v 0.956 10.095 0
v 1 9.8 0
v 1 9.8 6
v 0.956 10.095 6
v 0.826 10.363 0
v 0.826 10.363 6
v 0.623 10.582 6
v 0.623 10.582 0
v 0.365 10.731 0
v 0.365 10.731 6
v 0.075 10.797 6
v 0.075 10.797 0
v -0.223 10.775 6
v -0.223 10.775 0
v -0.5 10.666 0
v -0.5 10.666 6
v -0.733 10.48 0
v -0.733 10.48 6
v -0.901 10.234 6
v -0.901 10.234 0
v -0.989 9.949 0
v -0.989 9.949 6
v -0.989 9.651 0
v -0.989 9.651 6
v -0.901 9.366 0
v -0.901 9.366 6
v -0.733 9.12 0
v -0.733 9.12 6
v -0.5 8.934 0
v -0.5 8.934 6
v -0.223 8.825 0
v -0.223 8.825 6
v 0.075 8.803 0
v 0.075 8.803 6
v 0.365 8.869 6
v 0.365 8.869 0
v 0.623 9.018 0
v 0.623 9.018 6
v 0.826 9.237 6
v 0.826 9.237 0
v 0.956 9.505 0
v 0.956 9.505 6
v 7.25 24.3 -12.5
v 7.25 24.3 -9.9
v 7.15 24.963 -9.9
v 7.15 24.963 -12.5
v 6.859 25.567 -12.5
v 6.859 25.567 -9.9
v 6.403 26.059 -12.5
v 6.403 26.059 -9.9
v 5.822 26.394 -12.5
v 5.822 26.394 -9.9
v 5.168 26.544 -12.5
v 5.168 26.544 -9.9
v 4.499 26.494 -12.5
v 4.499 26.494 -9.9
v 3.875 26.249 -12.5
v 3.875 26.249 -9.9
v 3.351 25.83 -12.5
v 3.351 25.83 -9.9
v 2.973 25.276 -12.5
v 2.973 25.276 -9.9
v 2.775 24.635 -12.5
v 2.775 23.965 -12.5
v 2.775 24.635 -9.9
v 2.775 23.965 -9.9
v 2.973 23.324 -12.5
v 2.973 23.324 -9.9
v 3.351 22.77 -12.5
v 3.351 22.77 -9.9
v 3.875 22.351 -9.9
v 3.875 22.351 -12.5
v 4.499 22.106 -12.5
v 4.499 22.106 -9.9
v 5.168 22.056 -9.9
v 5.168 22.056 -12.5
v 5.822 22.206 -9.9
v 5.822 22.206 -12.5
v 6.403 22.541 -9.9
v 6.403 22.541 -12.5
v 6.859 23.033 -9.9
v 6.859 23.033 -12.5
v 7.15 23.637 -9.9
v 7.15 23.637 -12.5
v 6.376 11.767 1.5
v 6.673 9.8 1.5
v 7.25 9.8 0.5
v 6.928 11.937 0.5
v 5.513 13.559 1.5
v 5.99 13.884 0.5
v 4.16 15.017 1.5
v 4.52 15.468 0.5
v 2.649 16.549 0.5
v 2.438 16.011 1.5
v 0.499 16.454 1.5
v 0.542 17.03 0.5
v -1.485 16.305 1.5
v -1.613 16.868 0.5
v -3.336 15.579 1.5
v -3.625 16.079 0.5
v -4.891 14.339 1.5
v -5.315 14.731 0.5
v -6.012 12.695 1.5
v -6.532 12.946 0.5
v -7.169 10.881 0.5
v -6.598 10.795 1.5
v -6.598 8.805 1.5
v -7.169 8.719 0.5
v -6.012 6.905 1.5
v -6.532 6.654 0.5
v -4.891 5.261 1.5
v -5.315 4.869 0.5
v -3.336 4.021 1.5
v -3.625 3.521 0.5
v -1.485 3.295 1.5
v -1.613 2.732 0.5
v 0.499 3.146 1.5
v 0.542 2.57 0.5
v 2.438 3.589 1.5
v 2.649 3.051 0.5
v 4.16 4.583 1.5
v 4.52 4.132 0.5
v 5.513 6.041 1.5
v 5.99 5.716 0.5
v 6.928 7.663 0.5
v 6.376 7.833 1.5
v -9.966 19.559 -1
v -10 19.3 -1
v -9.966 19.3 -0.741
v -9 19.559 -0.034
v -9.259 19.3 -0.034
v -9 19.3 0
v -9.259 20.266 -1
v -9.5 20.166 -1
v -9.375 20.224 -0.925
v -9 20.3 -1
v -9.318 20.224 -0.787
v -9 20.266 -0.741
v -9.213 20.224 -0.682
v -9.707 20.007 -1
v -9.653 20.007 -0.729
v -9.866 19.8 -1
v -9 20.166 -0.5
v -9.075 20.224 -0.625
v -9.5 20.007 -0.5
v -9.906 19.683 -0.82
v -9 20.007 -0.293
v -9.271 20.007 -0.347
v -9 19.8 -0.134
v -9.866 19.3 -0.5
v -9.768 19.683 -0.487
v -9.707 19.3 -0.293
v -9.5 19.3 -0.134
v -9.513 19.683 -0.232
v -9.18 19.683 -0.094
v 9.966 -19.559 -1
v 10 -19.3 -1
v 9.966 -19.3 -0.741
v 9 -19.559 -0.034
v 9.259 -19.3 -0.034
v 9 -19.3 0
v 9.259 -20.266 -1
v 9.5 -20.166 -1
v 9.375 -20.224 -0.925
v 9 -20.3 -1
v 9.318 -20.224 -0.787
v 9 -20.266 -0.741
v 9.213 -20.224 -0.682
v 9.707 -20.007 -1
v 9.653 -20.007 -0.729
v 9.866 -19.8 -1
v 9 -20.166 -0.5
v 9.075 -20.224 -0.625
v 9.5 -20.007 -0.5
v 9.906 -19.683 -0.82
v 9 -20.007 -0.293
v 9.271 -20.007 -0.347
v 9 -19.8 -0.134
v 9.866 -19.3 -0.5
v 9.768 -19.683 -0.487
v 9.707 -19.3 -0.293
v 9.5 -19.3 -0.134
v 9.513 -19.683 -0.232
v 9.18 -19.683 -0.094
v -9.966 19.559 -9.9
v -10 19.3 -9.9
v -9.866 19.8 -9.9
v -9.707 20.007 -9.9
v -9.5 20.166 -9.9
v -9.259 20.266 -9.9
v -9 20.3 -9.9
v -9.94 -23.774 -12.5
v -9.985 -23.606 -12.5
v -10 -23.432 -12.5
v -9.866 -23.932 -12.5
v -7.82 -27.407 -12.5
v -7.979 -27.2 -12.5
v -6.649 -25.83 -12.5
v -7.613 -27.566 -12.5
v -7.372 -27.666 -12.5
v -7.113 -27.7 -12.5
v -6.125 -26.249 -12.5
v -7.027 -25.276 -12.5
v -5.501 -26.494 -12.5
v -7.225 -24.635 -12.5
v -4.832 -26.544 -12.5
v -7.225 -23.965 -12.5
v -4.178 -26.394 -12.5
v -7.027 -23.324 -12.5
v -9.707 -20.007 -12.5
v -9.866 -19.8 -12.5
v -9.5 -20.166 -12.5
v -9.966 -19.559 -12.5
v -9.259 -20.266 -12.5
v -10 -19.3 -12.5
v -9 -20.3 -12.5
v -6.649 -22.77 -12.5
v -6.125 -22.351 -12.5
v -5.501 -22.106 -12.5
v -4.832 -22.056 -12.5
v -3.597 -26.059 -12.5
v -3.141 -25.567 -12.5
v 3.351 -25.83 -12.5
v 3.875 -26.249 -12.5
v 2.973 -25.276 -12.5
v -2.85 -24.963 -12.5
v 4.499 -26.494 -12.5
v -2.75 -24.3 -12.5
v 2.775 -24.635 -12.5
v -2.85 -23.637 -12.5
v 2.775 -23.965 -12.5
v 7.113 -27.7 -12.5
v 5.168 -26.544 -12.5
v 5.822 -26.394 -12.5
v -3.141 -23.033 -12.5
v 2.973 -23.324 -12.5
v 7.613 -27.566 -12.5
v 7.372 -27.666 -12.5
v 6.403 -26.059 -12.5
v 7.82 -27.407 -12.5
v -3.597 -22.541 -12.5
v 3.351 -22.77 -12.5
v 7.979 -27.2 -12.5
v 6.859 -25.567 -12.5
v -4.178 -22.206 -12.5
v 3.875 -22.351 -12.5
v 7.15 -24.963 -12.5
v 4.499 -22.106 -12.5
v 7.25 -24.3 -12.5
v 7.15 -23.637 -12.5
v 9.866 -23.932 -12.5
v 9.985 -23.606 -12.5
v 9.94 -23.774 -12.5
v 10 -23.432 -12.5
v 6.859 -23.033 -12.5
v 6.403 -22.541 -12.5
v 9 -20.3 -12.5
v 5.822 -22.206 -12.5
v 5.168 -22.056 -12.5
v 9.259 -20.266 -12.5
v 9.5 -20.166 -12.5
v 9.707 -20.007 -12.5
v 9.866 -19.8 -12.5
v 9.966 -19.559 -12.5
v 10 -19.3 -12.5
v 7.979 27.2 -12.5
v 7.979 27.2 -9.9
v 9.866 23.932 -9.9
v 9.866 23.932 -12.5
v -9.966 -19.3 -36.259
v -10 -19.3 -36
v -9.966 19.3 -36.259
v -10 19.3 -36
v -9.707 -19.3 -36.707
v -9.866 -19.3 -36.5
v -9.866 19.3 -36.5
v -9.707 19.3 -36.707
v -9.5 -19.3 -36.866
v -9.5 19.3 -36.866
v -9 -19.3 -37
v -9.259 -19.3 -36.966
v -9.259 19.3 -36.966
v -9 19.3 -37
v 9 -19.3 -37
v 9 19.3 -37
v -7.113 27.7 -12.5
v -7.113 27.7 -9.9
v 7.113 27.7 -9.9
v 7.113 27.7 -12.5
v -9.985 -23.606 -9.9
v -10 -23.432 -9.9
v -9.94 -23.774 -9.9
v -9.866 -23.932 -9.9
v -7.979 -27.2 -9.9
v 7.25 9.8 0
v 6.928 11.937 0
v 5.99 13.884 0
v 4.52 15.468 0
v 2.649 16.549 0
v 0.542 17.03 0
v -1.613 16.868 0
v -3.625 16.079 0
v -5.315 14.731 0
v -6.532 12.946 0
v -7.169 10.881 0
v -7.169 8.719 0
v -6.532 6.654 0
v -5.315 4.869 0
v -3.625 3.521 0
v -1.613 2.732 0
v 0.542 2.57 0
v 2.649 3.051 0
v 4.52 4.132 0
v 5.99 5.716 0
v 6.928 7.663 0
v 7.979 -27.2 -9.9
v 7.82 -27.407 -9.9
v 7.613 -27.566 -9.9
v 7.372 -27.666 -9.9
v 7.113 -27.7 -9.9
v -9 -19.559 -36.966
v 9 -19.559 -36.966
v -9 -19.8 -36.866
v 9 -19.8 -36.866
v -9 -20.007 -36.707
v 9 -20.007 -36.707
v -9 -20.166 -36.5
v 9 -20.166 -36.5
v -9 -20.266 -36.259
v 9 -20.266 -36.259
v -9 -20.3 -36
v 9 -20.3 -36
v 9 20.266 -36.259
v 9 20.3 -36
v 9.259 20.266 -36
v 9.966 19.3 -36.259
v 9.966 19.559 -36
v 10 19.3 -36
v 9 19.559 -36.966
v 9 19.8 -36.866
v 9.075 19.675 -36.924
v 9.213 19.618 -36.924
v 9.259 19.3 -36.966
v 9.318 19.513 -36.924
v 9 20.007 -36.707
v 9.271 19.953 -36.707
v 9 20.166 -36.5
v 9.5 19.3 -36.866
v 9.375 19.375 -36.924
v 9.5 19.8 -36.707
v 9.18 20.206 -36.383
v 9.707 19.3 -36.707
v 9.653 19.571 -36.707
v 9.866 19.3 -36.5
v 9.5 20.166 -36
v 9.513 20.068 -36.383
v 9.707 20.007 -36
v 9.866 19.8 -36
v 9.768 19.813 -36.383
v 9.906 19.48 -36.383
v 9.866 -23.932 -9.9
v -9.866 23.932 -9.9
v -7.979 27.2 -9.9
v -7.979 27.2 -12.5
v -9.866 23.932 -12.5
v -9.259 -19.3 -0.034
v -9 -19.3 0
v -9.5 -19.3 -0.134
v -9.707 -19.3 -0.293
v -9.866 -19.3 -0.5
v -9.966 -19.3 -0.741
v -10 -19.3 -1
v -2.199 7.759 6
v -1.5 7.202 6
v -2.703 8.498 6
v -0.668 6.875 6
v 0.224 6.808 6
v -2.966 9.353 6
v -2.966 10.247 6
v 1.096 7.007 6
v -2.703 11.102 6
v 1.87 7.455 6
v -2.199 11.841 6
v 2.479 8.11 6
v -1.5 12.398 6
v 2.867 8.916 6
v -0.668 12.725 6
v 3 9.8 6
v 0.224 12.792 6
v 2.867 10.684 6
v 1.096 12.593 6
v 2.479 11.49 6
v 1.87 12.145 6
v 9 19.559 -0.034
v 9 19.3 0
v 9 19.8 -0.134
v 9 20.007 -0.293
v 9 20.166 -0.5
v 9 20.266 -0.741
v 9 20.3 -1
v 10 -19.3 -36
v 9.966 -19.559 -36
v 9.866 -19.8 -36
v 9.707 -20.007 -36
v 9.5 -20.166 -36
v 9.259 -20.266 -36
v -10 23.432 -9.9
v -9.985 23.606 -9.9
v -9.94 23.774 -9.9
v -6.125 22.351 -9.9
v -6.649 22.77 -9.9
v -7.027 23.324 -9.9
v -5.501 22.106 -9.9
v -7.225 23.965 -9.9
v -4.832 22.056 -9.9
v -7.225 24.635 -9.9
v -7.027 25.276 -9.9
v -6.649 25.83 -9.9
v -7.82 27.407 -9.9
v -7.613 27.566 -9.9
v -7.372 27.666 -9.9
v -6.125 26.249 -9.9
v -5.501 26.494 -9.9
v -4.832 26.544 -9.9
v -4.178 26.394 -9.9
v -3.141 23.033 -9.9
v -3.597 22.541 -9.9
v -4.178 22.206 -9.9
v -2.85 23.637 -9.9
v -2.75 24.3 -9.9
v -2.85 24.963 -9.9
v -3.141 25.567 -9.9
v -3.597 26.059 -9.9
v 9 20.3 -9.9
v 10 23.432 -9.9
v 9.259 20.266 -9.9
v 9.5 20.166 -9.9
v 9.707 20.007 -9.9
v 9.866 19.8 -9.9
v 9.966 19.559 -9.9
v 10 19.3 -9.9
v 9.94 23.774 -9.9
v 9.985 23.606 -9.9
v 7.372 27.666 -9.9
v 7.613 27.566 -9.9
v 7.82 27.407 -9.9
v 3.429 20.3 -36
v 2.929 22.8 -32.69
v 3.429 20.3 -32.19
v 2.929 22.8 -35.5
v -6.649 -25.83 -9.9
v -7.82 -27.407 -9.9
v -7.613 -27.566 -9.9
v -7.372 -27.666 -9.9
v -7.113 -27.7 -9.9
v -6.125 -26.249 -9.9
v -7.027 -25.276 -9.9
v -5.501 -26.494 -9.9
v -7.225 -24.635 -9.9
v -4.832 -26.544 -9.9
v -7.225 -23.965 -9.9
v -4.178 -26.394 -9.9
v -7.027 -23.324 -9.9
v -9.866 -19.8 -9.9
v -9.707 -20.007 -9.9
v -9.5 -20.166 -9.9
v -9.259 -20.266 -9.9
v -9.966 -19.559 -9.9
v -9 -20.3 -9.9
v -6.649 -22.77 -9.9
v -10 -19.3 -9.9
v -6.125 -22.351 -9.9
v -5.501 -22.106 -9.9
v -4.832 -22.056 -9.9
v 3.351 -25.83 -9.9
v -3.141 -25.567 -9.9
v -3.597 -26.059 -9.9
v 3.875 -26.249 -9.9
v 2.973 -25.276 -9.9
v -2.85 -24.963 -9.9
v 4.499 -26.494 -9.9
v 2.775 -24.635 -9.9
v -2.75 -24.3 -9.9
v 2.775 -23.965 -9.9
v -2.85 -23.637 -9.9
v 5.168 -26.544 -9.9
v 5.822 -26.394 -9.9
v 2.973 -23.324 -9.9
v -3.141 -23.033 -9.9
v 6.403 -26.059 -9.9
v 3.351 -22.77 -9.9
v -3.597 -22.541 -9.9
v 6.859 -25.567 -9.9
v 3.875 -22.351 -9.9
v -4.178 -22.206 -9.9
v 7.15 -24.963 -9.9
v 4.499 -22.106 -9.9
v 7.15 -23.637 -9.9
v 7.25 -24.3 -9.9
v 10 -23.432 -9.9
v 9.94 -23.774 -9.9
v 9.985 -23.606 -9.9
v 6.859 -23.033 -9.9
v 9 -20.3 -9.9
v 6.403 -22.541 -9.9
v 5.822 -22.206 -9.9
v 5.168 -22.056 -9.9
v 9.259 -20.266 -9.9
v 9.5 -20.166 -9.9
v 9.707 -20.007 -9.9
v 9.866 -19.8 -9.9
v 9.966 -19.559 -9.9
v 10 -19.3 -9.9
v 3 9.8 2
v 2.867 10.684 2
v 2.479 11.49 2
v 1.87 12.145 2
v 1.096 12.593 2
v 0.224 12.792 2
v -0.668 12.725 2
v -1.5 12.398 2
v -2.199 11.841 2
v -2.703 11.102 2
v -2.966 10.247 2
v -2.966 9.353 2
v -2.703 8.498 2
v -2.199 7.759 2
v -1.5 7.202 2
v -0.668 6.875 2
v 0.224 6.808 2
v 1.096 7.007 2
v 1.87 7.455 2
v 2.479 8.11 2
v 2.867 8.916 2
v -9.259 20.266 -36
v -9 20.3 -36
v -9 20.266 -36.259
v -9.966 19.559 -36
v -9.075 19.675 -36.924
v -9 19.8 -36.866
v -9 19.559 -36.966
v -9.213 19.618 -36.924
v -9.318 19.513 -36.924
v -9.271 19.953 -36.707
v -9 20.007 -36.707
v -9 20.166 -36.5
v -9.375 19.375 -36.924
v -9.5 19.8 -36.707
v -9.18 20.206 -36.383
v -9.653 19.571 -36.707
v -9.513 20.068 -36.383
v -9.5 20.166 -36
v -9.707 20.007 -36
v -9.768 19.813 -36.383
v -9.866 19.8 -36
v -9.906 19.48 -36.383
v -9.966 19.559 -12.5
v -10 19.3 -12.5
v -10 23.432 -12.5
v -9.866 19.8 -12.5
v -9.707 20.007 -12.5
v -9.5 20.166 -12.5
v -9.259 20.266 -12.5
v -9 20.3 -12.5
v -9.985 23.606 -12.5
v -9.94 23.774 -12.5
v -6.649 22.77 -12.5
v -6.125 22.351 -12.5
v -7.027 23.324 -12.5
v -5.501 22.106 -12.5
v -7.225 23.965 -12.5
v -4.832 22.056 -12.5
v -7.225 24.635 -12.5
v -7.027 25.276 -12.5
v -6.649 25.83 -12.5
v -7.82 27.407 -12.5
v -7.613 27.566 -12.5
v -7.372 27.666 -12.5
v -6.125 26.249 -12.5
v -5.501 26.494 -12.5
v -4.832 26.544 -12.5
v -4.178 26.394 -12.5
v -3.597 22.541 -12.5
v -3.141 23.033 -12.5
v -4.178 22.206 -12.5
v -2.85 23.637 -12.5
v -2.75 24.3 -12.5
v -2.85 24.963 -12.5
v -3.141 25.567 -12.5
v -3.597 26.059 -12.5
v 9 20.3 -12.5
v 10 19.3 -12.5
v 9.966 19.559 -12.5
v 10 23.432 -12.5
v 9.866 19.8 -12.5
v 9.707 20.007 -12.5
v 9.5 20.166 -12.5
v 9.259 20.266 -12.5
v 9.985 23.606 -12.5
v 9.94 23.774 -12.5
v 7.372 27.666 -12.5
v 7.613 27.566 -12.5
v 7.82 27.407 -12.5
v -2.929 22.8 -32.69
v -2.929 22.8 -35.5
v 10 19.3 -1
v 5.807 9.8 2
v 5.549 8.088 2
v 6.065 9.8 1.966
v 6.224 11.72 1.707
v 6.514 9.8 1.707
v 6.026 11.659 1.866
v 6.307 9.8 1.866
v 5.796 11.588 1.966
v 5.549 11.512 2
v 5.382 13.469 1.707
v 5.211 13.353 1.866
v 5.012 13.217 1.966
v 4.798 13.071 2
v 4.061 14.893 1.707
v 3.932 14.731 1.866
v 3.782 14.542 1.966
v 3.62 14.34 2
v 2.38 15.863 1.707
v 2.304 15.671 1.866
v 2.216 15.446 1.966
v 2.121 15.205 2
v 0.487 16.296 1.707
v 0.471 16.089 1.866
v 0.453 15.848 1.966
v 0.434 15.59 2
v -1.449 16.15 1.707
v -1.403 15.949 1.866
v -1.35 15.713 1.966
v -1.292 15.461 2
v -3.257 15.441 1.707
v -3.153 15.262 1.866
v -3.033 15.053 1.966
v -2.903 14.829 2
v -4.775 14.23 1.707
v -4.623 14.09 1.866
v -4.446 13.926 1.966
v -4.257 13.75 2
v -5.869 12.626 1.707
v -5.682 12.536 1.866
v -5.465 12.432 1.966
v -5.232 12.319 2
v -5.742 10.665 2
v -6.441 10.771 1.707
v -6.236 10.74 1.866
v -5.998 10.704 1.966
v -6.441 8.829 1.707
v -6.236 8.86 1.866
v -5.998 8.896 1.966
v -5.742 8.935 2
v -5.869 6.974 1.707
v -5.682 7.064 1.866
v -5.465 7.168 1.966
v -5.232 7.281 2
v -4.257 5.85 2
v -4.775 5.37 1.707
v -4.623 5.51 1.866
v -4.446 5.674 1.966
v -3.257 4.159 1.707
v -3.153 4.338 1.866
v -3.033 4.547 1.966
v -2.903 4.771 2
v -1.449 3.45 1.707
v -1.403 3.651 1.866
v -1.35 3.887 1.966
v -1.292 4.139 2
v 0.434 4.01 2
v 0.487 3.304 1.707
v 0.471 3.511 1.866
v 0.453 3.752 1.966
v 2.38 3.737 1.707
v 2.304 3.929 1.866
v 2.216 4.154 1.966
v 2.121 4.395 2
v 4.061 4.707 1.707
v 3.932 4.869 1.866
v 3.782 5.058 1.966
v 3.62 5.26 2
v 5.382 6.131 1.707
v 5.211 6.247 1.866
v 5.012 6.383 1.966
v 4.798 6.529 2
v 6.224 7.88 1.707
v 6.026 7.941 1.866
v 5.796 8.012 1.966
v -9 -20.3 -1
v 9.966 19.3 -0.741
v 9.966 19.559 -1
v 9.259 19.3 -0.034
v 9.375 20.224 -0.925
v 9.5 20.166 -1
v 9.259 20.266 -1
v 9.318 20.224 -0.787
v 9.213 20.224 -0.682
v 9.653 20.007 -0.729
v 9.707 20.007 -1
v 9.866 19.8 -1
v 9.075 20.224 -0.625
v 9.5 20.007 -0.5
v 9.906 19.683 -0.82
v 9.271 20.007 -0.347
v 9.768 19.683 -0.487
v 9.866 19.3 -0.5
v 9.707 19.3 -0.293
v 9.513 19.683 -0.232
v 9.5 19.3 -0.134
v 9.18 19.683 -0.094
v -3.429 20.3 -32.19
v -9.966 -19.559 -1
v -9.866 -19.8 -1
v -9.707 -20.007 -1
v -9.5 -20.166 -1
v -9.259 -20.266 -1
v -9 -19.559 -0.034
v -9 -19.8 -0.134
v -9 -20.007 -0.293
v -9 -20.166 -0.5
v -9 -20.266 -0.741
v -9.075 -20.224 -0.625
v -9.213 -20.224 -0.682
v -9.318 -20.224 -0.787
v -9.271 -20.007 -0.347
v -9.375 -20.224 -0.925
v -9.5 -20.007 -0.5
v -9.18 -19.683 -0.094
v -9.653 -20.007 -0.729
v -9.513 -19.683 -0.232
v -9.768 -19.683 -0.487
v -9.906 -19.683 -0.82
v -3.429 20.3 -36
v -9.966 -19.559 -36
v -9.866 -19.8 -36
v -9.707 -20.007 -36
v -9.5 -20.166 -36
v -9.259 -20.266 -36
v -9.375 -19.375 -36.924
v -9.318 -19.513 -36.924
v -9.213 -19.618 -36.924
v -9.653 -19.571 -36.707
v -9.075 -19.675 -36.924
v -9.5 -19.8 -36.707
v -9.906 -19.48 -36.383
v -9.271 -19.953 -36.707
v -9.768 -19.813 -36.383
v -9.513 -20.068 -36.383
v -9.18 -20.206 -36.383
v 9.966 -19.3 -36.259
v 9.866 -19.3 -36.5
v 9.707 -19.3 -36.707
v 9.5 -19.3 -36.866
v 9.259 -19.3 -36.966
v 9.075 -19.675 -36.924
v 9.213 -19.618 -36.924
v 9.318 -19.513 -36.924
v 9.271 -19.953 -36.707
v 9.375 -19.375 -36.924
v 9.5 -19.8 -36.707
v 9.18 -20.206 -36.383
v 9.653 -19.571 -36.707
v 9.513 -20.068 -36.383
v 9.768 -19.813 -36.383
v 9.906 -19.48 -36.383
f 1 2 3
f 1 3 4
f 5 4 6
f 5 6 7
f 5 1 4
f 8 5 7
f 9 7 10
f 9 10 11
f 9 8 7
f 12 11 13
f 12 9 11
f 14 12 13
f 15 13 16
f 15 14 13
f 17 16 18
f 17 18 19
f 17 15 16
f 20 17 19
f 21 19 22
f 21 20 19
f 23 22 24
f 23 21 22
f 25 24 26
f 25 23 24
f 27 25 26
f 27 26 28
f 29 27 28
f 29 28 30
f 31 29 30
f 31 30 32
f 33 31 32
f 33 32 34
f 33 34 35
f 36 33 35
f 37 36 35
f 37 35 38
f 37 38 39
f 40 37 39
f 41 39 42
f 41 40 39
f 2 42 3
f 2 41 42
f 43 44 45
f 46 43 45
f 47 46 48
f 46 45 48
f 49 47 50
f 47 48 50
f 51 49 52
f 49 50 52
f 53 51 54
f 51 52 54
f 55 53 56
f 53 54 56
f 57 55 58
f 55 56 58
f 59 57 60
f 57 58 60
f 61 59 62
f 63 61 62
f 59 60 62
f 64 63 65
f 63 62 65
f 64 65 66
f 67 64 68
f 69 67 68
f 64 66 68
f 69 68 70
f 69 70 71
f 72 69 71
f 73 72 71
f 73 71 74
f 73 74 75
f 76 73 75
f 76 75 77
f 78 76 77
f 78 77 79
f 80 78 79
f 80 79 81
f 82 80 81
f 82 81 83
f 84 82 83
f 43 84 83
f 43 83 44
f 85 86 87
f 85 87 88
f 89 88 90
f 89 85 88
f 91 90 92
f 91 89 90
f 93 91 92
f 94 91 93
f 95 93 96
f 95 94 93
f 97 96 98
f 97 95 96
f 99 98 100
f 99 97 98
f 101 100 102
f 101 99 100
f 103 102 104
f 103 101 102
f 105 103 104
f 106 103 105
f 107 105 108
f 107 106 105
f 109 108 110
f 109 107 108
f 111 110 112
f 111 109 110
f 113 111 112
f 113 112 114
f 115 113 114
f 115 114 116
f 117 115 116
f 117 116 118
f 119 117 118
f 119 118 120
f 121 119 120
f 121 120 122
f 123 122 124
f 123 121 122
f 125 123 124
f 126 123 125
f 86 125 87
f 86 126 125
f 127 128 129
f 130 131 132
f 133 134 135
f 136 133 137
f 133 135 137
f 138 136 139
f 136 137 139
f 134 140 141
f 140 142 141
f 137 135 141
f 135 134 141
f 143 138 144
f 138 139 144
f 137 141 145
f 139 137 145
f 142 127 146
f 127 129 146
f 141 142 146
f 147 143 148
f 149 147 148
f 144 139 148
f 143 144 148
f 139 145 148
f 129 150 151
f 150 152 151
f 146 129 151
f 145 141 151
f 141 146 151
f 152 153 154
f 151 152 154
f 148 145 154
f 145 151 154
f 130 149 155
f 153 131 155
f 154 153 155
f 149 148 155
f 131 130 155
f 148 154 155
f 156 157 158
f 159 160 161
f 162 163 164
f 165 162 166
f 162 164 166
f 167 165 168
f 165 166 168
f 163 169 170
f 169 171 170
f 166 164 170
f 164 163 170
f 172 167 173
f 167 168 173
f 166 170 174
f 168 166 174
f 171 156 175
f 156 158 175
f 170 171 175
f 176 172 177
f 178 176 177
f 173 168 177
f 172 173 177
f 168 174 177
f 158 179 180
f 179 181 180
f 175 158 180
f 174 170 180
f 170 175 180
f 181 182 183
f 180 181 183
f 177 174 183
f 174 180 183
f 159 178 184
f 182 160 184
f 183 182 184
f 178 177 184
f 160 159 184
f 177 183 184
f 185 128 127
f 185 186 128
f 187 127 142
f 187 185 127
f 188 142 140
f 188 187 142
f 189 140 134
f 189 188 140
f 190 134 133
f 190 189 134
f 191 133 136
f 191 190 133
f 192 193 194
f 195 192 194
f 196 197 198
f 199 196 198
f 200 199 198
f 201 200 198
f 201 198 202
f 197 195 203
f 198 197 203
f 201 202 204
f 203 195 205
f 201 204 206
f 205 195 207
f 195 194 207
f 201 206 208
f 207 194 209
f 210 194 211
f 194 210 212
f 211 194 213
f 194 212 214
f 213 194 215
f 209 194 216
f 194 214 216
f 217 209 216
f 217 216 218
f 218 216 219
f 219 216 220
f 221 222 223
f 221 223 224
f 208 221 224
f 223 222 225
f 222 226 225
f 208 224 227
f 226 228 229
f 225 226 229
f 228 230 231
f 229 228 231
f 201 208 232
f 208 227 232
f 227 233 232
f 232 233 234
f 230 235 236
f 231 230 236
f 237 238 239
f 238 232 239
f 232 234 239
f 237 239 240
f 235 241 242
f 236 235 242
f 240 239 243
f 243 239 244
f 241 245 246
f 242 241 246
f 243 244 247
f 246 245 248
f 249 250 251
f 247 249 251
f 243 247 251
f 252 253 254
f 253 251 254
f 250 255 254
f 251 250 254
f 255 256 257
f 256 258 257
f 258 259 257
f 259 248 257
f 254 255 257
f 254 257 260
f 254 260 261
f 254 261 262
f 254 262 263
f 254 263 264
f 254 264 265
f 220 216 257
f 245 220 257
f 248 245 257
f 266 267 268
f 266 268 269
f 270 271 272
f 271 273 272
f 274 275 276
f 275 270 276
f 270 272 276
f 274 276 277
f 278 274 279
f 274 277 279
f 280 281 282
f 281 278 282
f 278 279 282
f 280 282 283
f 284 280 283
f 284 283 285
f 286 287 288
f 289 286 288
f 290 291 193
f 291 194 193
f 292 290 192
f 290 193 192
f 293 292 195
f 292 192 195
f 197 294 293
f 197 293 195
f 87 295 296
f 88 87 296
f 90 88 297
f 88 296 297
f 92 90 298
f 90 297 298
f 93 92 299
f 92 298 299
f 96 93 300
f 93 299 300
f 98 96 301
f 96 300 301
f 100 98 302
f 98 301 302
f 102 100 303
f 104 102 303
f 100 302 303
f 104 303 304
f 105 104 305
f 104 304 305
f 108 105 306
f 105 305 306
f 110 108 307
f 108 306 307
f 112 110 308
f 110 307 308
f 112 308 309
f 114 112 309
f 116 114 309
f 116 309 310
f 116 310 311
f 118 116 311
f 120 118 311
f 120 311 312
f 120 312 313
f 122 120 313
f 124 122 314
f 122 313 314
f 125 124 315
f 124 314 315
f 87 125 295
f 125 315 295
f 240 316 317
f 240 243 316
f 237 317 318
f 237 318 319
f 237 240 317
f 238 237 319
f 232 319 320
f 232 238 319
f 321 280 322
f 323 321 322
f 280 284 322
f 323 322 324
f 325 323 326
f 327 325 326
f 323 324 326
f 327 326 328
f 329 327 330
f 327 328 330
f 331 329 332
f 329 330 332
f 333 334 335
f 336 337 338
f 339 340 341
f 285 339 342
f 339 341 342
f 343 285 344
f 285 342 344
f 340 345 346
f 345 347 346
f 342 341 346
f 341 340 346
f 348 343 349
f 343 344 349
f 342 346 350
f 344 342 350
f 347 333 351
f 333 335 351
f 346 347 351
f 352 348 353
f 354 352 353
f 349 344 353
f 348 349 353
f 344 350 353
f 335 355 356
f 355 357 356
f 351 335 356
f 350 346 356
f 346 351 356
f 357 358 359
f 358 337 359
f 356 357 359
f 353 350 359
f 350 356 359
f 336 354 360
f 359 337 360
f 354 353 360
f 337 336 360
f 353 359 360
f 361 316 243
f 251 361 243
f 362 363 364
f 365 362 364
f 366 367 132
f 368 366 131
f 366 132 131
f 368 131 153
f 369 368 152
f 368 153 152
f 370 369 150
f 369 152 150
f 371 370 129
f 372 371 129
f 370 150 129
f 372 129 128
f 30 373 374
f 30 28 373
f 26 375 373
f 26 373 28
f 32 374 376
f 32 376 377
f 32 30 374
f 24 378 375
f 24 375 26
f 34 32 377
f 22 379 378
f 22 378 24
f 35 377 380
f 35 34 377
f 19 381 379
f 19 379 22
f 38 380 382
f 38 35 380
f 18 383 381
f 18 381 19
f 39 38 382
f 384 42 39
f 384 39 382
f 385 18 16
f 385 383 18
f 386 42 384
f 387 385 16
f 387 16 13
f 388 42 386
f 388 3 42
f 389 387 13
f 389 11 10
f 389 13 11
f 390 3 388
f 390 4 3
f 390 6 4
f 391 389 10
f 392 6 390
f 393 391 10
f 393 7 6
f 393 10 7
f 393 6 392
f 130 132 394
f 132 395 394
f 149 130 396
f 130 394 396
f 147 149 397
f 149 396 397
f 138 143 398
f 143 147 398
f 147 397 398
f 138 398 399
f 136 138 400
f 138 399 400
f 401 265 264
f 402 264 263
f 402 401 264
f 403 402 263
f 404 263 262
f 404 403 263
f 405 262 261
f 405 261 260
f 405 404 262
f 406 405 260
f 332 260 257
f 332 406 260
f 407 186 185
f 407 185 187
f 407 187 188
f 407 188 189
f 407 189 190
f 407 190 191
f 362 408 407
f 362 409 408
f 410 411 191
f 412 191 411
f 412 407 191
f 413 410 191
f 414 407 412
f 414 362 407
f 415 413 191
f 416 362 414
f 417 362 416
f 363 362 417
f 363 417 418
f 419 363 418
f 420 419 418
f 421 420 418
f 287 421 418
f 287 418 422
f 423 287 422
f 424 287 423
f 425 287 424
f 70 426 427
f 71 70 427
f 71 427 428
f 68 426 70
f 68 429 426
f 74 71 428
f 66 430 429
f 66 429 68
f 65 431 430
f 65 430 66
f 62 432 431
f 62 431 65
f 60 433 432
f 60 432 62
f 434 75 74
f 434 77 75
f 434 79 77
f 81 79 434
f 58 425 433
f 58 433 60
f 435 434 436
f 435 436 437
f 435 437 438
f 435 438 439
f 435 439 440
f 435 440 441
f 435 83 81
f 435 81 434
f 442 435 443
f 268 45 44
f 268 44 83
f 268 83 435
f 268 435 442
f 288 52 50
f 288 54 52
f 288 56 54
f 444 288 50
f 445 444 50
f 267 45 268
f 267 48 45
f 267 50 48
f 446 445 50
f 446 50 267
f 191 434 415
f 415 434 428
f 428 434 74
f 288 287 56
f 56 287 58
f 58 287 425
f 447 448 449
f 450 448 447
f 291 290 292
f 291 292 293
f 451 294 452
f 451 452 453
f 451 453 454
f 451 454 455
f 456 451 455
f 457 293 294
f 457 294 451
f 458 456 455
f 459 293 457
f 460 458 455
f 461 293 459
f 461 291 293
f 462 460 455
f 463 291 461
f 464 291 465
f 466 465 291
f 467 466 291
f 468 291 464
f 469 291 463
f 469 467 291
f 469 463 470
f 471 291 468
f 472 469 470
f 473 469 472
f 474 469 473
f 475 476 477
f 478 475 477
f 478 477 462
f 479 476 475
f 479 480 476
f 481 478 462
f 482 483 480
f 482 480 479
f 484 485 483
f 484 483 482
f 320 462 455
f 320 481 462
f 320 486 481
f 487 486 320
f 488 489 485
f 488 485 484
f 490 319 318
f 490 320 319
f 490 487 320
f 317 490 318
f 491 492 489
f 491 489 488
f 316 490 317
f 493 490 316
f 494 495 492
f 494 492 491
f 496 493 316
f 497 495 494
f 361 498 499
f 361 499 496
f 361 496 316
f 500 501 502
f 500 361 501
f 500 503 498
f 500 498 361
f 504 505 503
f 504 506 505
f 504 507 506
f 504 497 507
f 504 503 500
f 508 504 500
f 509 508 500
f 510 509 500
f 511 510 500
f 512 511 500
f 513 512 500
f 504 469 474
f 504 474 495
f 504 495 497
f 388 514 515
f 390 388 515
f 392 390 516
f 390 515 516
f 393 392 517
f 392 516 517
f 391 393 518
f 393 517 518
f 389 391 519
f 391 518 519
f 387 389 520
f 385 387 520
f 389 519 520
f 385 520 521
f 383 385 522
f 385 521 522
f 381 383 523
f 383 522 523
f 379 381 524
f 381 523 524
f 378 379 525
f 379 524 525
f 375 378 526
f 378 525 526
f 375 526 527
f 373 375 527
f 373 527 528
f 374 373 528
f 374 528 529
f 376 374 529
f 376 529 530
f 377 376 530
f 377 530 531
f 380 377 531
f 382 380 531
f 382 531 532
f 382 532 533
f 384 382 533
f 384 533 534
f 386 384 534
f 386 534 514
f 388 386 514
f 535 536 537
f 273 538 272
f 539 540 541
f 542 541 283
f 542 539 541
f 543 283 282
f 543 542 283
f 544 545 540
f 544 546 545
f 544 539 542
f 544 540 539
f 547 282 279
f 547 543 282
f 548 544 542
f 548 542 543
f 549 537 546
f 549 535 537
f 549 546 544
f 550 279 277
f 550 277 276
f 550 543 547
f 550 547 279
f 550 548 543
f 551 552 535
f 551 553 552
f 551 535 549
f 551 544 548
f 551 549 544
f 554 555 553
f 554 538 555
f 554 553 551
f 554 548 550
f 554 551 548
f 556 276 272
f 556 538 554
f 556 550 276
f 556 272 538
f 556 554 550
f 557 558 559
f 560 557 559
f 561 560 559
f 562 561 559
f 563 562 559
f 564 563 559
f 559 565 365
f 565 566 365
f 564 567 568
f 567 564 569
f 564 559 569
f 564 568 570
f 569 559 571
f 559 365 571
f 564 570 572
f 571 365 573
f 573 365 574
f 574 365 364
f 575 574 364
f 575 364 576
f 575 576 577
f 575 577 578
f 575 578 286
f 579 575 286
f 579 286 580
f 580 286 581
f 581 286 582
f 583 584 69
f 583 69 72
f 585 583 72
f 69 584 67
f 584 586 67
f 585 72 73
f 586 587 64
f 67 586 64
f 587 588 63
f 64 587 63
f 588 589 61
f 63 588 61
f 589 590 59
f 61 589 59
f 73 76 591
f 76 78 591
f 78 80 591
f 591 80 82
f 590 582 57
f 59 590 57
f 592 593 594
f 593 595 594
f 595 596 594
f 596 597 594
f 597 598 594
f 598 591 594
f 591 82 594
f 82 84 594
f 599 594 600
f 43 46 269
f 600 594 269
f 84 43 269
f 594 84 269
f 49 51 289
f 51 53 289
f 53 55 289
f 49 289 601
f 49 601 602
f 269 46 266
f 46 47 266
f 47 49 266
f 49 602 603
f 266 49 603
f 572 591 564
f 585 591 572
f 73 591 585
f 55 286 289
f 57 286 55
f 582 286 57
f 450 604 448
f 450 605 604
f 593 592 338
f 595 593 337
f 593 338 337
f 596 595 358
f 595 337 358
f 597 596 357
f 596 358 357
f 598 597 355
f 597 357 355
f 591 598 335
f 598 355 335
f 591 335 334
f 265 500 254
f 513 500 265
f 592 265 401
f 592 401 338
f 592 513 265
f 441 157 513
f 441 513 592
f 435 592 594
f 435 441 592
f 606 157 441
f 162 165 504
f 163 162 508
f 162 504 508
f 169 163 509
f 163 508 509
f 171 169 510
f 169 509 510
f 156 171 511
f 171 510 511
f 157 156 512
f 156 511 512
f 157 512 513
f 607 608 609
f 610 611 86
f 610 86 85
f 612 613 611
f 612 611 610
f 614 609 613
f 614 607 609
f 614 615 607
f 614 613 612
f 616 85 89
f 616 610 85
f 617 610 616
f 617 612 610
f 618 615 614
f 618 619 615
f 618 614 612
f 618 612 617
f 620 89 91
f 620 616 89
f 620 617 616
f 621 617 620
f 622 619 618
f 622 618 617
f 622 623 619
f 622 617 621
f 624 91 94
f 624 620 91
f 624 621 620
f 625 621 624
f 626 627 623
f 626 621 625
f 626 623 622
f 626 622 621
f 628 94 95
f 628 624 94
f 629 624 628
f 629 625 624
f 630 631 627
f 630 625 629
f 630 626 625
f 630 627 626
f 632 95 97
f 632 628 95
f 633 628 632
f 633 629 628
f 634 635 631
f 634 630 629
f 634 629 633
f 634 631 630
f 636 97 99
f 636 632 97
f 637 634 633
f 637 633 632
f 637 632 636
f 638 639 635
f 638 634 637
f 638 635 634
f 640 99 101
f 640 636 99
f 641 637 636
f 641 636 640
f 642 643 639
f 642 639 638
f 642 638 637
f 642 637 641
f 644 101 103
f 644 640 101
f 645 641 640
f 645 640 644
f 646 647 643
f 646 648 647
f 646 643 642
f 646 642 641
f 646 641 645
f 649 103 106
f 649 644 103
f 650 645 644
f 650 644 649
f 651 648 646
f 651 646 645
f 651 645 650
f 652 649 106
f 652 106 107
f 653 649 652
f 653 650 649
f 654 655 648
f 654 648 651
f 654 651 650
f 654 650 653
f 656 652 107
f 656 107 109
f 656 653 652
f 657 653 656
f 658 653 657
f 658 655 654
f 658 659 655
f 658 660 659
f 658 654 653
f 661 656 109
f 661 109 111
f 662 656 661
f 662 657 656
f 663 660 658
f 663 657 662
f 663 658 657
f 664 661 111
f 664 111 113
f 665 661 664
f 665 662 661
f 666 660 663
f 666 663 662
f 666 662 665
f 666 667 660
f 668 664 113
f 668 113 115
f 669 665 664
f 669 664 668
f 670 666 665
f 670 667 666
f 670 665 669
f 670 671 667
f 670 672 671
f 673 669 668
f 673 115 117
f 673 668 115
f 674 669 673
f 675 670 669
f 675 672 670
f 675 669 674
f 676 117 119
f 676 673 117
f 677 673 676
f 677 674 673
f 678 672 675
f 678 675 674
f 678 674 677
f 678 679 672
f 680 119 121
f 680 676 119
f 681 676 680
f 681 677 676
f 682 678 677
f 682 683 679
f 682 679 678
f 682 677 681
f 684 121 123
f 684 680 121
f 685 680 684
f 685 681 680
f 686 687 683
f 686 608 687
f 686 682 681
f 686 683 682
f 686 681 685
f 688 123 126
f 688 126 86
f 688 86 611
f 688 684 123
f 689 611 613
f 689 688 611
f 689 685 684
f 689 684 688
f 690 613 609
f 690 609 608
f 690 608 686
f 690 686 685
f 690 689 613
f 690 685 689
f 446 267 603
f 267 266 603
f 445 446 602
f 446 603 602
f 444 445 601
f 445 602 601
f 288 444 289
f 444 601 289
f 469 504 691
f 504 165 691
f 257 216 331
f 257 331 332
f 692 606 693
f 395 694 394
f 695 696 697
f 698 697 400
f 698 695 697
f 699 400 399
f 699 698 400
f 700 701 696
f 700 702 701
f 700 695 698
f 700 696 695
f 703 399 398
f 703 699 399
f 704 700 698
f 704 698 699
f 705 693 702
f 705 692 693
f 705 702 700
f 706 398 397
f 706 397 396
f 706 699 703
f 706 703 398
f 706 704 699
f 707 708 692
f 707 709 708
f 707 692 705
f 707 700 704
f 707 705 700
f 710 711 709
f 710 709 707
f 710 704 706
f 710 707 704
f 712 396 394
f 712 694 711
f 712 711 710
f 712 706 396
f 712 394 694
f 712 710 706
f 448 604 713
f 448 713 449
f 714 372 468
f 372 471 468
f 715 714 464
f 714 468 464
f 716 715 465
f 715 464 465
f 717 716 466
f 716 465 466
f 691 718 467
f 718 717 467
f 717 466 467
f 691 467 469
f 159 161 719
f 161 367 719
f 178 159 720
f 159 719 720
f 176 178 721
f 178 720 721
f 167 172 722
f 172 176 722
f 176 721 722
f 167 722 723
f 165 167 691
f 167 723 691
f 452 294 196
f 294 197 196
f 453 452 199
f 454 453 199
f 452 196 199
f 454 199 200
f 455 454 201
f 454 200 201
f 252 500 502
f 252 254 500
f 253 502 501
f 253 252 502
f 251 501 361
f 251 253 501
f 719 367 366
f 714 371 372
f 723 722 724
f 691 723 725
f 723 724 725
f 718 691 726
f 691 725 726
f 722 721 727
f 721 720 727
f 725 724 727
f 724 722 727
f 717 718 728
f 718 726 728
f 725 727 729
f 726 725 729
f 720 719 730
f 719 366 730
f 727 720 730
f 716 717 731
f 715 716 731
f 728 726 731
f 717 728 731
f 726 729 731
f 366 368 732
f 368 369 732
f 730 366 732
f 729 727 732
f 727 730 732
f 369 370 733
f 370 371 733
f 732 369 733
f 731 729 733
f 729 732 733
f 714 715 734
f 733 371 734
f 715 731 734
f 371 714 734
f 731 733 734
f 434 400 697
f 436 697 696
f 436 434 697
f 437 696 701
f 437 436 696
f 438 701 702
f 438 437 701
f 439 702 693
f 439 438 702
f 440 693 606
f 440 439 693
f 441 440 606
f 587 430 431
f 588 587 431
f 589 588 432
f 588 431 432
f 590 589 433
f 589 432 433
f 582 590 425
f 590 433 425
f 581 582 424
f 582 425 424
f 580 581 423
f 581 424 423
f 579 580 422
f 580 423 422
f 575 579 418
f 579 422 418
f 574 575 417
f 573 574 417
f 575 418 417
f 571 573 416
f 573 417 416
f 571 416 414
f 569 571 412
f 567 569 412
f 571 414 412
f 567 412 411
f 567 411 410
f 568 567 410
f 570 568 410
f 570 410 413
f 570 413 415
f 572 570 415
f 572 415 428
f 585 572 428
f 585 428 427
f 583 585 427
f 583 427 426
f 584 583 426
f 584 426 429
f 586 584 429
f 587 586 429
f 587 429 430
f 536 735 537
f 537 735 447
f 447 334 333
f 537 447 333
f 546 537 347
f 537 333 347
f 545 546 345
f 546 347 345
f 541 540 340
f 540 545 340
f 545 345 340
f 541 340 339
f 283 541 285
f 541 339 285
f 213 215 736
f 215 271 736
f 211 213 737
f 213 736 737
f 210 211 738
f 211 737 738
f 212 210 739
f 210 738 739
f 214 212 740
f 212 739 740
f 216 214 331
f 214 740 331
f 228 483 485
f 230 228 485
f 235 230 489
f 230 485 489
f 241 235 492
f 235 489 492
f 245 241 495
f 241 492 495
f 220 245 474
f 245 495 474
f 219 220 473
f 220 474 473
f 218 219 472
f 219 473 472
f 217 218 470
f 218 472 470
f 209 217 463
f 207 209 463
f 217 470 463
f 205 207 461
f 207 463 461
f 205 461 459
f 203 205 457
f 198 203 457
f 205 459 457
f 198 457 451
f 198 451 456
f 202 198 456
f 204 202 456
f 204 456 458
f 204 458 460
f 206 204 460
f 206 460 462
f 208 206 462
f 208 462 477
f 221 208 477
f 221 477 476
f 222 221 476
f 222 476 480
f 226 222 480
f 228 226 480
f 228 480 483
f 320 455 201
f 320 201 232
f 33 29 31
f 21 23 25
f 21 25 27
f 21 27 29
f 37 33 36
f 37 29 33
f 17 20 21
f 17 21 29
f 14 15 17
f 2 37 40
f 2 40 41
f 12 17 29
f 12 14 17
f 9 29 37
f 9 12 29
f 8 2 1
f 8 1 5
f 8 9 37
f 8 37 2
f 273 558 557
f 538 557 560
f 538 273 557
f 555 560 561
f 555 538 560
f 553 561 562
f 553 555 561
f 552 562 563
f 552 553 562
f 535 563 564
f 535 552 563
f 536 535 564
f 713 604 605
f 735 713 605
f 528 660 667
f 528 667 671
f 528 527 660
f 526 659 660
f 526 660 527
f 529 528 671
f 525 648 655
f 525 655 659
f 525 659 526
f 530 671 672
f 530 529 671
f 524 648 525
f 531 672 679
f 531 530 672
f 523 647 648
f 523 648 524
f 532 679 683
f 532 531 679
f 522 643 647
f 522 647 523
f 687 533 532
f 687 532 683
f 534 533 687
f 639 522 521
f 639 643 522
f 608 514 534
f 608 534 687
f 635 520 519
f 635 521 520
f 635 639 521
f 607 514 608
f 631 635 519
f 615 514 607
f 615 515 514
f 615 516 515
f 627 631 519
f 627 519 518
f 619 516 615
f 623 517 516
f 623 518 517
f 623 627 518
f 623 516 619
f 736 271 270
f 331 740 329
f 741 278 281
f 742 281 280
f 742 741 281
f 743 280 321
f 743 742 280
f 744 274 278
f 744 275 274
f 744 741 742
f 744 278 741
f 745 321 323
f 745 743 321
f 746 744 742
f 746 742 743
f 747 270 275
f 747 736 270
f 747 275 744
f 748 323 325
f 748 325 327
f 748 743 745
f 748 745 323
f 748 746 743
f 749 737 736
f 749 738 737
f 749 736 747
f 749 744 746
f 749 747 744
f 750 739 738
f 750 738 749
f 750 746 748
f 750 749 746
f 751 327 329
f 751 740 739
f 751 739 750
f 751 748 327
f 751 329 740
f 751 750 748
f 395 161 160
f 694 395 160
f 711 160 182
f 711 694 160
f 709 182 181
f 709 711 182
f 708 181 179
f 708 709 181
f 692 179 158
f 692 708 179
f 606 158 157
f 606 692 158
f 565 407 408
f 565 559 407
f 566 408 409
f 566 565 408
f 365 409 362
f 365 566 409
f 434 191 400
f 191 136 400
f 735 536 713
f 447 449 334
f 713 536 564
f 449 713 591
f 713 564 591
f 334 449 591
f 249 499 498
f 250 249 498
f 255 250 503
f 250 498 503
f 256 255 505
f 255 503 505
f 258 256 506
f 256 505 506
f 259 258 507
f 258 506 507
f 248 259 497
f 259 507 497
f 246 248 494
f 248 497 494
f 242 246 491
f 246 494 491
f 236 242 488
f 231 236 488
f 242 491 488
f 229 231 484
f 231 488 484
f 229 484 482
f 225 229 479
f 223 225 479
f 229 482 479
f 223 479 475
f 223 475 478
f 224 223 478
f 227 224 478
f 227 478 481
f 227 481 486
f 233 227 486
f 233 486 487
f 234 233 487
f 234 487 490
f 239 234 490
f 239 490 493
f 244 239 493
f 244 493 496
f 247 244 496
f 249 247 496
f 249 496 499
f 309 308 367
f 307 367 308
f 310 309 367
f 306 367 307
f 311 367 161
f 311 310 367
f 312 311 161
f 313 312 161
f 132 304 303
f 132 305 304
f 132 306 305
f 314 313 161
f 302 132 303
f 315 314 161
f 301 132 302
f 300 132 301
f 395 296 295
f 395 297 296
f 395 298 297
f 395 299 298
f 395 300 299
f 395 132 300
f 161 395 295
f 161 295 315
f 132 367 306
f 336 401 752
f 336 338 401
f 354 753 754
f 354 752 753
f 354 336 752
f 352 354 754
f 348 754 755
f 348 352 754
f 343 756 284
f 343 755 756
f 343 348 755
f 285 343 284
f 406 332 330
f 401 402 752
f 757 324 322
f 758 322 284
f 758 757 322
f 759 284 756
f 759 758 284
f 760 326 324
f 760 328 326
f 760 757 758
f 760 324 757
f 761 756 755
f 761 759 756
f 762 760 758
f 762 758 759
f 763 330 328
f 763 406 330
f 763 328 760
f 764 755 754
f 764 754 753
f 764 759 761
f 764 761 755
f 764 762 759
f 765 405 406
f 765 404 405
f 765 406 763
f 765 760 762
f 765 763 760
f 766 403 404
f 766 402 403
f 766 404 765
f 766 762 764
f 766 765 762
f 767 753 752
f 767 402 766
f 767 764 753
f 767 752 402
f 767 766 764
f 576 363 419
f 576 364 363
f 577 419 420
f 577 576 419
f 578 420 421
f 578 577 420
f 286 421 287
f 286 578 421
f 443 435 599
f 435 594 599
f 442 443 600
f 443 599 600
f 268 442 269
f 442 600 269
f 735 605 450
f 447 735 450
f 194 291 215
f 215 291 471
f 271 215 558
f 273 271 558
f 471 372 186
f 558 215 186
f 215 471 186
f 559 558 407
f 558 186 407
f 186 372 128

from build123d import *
from OCP.BRepFilletAPI import BRepFilletAPI_MakeChamfer

# Parameters (mm, degrees)
SKETCH3_W           = 20
SKETCH3_H           = 40.6
BOSS_EXTRUDE1_DEPTH = 37
SKETCH3_3_W         = 20
SKETCH3_3_H         = 7.4
SKETCH3_3_R         = 2.25
BOSS_EXTRUDE2_DEPTH = 12.5
SKETCH3_4_W         = 20
SKETCH3_4_H         = 7.4
SKETCH3_4_R         = 2.25
CUT_EXTRUDE1_DEPTH  = 9.9
SKETCH3_5_R         = 3
SKETCH3_5_R_2       = 1
BOSS_EXTRUDE3_DEPTH = 6
SKETCH3_6_R         = 7.25
SKETCH3_6_R_2       = 3
BOSS_EXTRUDE4_DEPTH = 2
CHAMFER1_SIZE       = 4
CHAMFER1_SIZE2      = 2.309401077
CHAMFER3_SIZE       = 1.5
CHAMFER3_SIZE2      = 0.866025404
FILLET2_R           = 1
SKETCH4_W           = 6.858
SKETCH4_H           = 3.81
BOSS_EXTRUDE6_DEPTH = 2.5
CHAMFER4_SIZE       = 2.5
CHAMFER4_SIZE_2     = 0.5


with BuildPart() as part:
    # Sketch3 → Boss-Extrude1 (new body)
    with BuildSketch(Plane.XY):
        Rectangle(SKETCH3_W, SKETCH3_H)
    extrude(amount=-BOSS_EXTRUDE1_DEPTH)

    # Sketch3<3> → Boss-Extrude2 (add)
    # profile 1 of 2: a face of its own
    with BuildSketch(Plane.XY):
        with Locations((0, 24)):
            Rectangle(SKETCH3_3_W, SKETCH3_3_H)
        with Locations((-5, 24.3)):
            Circle(SKETCH3_3_R, mode=Mode.SUBTRACT)
        with Locations((5, 24.3)):
            Circle(SKETCH3_3_R, mode=Mode.SUBTRACT)
    # profile 2 of 2: a face of its own
    with BuildSketch(Plane.XY):
        Polygon((10, -20.3), (-10, -20.3), (-10, -27.7), (0, -27.7), (10, -27.7), align=None)
        with Locations((-5, -24.3)):
            Circle(SKETCH3_3_R, mode=Mode.SUBTRACT)
        with Locations((5, -24.3)):
            Circle(SKETCH3_3_R, mode=Mode.SUBTRACT)
    extrude(amount=-BOSS_EXTRUDE2_DEPTH)

    # Sketch3<4> → Cut-Extrude1 (cut)
    # profile 1 of 2: a face of its own
    with BuildSketch(Plane.XY):
        with Locations((0, 24)):
            Rectangle(SKETCH3_4_W, SKETCH3_4_H)
        with Locations((-5, 24.3)):
            Circle(SKETCH3_4_R, mode=Mode.SUBTRACT)
        with Locations((5, 24.3)):
            Circle(SKETCH3_4_R, mode=Mode.SUBTRACT)
    # profile 2 of 2: a face of its own
    with BuildSketch(Plane.XY):
        Polygon((10, -20.3), (-10, -20.3), (-10, -27.7), (0, -27.7), (10, -27.7), align=None)
        with Locations((-5, -24.3)):
            Circle(SKETCH3_4_R, mode=Mode.SUBTRACT)
        with Locations((5, -24.3)):
            Circle(SKETCH3_4_R, mode=Mode.SUBTRACT)
    extrude(amount=-CUT_EXTRUDE1_DEPTH, mode=Mode.SUBTRACT)

    # Sketch3<5> → Boss-Extrude3 (add)
    with BuildSketch(Plane.XY):
        with Locations((0, 9.8)):
            Circle(SKETCH3_5_R)
        with Locations((0, 9.8)):
            Circle(SKETCH3_5_R_2, mode=Mode.SUBTRACT)
    extrude(amount=BOSS_EXTRUDE3_DEPTH)

    # Sketch3<6> → Boss-Extrude4 (add)
    with BuildSketch(Plane.XY):
        with Locations((0, 9.8)):
            Circle(SKETCH3_6_R)
        with Locations((0, 9.8)):
            Circle(SKETCH3_6_R_2, mode=Mode.SUBTRACT)
    extrude(amount=BOSS_EXTRUDE4_DEPTH)

    # Chamfer1: one chamfer whose edges measure the first distance from different faces: ONE call of the kernel's chamfer builder (chamfer() names one face for all edges)
    chamfer1_edges_1 = [part.edges().sort_by_distance(p)[0] for p in [
        (10, 27.7, -11.2),
        (10, -27.7, -11.2),
    ]]
    chamfer1_side_1 = [part.faces().sort_by_distance(p)[0] for p in [
        (10, 0, -18.317675312),
    ]]
    chamfer1_edges_2 = [part.edges().sort_by_distance(p)[0] for p in [
        (-10, 27.7, -11.2),
        (-10, -27.7, -11.2),
    ]]
    chamfer1_side_2 = [part.faces().sort_by_distance(p)[0] for p in [
        (-10, 0, -18.317675312),
    ]]
    chamfer1 = BRepFilletAPI_MakeChamfer(part.part.solid().wrapped)
    for e in chamfer1_edges_1:
        chamfer1.Add(CHAMFER1_SIZE, CHAMFER1_SIZE2, e.wrapped, chamfer1_side_1[0].wrapped)  # the first distance lies on this face
    for e in chamfer1_edges_2:
        chamfer1.Add(CHAMFER1_SIZE, CHAMFER1_SIZE2, e.wrapped, chamfer1_side_2[0].wrapped)  # the first distance lies on this face
    add(Compound.cast(chamfer1.Shape()), mode=Mode.REPLACE)

    # Chamfer3
    chamfer3_edges = [part.edges().sort_by_distance(p)[0] for p in [
        (-7.25, 9.8, 2),
    ]]
    chamfer3_side = [part.faces().sort_by_distance(p)[0] for p in [
        (-7.25, 9.8, 1),
    ]]
    chamfer(chamfer3_edges, length=CHAMFER3_SIZE, length2=CHAMFER3_SIZE2, reference=chamfer3_side[0])

    # Fillet2
    fillet2_edges = [part.edges().sort_by_distance(p)[0] for p in [
        (10, -20.3, -24.75),
        (-10, -20.3, -24.75),
        (-10, 20.3, -24.75),
        (10, 20.3, -24.75),
        (-7.690598923, -27.7, -11.2),
        (7.690598923, -27.7, -11.2),
        (0, 20.3, -37),
        (10, 23.7, -11.2),
        (10, -23.7, -11.2),
        (-10, 23.7, -11.2),
        (-10, -23.7, -11.2),
        (-7.690598923, 27.7, -11.2),
        (7.690598923, 27.7, -11.2),
        (-6.383974596, 9.8, 2),
        (-10, 0, -37),
        (0, -20.3, -37),
        (10, 0, -37),
        (10, 0, 0),
        (-10, 0, 0),
        (10, 20.3, -4.95),
        (-10, 20.3, -4.95),
        (0, 20.3, 0),
        (10, -20.3, -4.95),
        (0, -20.3, 0),
        (-10, -20.3, -4.95),
    ]]
    fillet(fillet2_edges, radius=FILLET2_R)

    # Sketch4 → Boss-Extrude6 (add)
    with BuildSketch(Plane(origin=(0, 20.3, 0), x_dir=(1, 0, 0), z_dir=(0, 1, 0))):
        with Locations((0, 34.095)):
            Rectangle(SKETCH4_W, SKETCH4_H)
    extrude(amount=BOSS_EXTRUDE6_DEPTH)

    # Chamfer4
    chamfer4_edges_1 = [part.edges().sort_by_distance(p)[0] for p in [
        (0, 22.8, -32.19),
    ]]
    chamfer4_side_1 = [part.faces().sort_by_distance(p)[0] for p in [
        (0, 22.79, -32.19),
    ]]
    chamfer4_edges_2 = [part.edges().sort_by_distance(p)[0] for p in [
        (-3.429, 22.8, -34.095),
    ]]
    chamfer4_side_2 = [part.faces().sort_by_distance(p)[0] for p in [
        (-3.429, 22.79, -34.095),
    ]]
    chamfer4_edges_3 = [part.edges().sort_by_distance(p)[0] for p in [
        (0, 22.8, -36),
    ]]
    chamfer4_side_3 = [part.faces().sort_by_distance(p)[0] for p in [
        (0, 22.79, -36),
    ]]
    chamfer4_edges_4 = [part.edges().sort_by_distance(p)[0] for p in [
        (3.429, 22.8, -34.095),
    ]]
    chamfer4_side_4 = [part.faces().sort_by_distance(p)[0] for p in [
        (3.429, 22.79, -34.095),
    ]]
    chamfer4 = BRepFilletAPI_MakeChamfer(part.part.solid().wrapped)
    for e in chamfer4_edges_1:
        chamfer4.Add(CHAMFER4_SIZE - 0.0001, CHAMFER4_SIZE_2 - 0.0001, e.wrapped, chamfer4_side_1[0].wrapped)
    for e in chamfer4_edges_2:
        chamfer4.Add(CHAMFER4_SIZE - 0.0001, CHAMFER4_SIZE_2 - 0.0001, e.wrapped, chamfer4_side_2[0].wrapped)
    for e in chamfer4_edges_3:
        chamfer4.Add(CHAMFER4_SIZE - 0.0001, CHAMFER4_SIZE_2 - 0.0001, e.wrapped, chamfer4_side_3[0].wrapped)
    for e in chamfer4_edges_4:
        chamfer4.Add(CHAMFER4_SIZE - 0.0001, CHAMFER4_SIZE_2 - 0.0001, e.wrapped, chamfer4_side_4[0].wrapped)
    add(Compound.cast(chamfer4.Shape()), mode=Mode.REPLACE)  # a hair under: the kernel refuses the full size


solid = part.part
